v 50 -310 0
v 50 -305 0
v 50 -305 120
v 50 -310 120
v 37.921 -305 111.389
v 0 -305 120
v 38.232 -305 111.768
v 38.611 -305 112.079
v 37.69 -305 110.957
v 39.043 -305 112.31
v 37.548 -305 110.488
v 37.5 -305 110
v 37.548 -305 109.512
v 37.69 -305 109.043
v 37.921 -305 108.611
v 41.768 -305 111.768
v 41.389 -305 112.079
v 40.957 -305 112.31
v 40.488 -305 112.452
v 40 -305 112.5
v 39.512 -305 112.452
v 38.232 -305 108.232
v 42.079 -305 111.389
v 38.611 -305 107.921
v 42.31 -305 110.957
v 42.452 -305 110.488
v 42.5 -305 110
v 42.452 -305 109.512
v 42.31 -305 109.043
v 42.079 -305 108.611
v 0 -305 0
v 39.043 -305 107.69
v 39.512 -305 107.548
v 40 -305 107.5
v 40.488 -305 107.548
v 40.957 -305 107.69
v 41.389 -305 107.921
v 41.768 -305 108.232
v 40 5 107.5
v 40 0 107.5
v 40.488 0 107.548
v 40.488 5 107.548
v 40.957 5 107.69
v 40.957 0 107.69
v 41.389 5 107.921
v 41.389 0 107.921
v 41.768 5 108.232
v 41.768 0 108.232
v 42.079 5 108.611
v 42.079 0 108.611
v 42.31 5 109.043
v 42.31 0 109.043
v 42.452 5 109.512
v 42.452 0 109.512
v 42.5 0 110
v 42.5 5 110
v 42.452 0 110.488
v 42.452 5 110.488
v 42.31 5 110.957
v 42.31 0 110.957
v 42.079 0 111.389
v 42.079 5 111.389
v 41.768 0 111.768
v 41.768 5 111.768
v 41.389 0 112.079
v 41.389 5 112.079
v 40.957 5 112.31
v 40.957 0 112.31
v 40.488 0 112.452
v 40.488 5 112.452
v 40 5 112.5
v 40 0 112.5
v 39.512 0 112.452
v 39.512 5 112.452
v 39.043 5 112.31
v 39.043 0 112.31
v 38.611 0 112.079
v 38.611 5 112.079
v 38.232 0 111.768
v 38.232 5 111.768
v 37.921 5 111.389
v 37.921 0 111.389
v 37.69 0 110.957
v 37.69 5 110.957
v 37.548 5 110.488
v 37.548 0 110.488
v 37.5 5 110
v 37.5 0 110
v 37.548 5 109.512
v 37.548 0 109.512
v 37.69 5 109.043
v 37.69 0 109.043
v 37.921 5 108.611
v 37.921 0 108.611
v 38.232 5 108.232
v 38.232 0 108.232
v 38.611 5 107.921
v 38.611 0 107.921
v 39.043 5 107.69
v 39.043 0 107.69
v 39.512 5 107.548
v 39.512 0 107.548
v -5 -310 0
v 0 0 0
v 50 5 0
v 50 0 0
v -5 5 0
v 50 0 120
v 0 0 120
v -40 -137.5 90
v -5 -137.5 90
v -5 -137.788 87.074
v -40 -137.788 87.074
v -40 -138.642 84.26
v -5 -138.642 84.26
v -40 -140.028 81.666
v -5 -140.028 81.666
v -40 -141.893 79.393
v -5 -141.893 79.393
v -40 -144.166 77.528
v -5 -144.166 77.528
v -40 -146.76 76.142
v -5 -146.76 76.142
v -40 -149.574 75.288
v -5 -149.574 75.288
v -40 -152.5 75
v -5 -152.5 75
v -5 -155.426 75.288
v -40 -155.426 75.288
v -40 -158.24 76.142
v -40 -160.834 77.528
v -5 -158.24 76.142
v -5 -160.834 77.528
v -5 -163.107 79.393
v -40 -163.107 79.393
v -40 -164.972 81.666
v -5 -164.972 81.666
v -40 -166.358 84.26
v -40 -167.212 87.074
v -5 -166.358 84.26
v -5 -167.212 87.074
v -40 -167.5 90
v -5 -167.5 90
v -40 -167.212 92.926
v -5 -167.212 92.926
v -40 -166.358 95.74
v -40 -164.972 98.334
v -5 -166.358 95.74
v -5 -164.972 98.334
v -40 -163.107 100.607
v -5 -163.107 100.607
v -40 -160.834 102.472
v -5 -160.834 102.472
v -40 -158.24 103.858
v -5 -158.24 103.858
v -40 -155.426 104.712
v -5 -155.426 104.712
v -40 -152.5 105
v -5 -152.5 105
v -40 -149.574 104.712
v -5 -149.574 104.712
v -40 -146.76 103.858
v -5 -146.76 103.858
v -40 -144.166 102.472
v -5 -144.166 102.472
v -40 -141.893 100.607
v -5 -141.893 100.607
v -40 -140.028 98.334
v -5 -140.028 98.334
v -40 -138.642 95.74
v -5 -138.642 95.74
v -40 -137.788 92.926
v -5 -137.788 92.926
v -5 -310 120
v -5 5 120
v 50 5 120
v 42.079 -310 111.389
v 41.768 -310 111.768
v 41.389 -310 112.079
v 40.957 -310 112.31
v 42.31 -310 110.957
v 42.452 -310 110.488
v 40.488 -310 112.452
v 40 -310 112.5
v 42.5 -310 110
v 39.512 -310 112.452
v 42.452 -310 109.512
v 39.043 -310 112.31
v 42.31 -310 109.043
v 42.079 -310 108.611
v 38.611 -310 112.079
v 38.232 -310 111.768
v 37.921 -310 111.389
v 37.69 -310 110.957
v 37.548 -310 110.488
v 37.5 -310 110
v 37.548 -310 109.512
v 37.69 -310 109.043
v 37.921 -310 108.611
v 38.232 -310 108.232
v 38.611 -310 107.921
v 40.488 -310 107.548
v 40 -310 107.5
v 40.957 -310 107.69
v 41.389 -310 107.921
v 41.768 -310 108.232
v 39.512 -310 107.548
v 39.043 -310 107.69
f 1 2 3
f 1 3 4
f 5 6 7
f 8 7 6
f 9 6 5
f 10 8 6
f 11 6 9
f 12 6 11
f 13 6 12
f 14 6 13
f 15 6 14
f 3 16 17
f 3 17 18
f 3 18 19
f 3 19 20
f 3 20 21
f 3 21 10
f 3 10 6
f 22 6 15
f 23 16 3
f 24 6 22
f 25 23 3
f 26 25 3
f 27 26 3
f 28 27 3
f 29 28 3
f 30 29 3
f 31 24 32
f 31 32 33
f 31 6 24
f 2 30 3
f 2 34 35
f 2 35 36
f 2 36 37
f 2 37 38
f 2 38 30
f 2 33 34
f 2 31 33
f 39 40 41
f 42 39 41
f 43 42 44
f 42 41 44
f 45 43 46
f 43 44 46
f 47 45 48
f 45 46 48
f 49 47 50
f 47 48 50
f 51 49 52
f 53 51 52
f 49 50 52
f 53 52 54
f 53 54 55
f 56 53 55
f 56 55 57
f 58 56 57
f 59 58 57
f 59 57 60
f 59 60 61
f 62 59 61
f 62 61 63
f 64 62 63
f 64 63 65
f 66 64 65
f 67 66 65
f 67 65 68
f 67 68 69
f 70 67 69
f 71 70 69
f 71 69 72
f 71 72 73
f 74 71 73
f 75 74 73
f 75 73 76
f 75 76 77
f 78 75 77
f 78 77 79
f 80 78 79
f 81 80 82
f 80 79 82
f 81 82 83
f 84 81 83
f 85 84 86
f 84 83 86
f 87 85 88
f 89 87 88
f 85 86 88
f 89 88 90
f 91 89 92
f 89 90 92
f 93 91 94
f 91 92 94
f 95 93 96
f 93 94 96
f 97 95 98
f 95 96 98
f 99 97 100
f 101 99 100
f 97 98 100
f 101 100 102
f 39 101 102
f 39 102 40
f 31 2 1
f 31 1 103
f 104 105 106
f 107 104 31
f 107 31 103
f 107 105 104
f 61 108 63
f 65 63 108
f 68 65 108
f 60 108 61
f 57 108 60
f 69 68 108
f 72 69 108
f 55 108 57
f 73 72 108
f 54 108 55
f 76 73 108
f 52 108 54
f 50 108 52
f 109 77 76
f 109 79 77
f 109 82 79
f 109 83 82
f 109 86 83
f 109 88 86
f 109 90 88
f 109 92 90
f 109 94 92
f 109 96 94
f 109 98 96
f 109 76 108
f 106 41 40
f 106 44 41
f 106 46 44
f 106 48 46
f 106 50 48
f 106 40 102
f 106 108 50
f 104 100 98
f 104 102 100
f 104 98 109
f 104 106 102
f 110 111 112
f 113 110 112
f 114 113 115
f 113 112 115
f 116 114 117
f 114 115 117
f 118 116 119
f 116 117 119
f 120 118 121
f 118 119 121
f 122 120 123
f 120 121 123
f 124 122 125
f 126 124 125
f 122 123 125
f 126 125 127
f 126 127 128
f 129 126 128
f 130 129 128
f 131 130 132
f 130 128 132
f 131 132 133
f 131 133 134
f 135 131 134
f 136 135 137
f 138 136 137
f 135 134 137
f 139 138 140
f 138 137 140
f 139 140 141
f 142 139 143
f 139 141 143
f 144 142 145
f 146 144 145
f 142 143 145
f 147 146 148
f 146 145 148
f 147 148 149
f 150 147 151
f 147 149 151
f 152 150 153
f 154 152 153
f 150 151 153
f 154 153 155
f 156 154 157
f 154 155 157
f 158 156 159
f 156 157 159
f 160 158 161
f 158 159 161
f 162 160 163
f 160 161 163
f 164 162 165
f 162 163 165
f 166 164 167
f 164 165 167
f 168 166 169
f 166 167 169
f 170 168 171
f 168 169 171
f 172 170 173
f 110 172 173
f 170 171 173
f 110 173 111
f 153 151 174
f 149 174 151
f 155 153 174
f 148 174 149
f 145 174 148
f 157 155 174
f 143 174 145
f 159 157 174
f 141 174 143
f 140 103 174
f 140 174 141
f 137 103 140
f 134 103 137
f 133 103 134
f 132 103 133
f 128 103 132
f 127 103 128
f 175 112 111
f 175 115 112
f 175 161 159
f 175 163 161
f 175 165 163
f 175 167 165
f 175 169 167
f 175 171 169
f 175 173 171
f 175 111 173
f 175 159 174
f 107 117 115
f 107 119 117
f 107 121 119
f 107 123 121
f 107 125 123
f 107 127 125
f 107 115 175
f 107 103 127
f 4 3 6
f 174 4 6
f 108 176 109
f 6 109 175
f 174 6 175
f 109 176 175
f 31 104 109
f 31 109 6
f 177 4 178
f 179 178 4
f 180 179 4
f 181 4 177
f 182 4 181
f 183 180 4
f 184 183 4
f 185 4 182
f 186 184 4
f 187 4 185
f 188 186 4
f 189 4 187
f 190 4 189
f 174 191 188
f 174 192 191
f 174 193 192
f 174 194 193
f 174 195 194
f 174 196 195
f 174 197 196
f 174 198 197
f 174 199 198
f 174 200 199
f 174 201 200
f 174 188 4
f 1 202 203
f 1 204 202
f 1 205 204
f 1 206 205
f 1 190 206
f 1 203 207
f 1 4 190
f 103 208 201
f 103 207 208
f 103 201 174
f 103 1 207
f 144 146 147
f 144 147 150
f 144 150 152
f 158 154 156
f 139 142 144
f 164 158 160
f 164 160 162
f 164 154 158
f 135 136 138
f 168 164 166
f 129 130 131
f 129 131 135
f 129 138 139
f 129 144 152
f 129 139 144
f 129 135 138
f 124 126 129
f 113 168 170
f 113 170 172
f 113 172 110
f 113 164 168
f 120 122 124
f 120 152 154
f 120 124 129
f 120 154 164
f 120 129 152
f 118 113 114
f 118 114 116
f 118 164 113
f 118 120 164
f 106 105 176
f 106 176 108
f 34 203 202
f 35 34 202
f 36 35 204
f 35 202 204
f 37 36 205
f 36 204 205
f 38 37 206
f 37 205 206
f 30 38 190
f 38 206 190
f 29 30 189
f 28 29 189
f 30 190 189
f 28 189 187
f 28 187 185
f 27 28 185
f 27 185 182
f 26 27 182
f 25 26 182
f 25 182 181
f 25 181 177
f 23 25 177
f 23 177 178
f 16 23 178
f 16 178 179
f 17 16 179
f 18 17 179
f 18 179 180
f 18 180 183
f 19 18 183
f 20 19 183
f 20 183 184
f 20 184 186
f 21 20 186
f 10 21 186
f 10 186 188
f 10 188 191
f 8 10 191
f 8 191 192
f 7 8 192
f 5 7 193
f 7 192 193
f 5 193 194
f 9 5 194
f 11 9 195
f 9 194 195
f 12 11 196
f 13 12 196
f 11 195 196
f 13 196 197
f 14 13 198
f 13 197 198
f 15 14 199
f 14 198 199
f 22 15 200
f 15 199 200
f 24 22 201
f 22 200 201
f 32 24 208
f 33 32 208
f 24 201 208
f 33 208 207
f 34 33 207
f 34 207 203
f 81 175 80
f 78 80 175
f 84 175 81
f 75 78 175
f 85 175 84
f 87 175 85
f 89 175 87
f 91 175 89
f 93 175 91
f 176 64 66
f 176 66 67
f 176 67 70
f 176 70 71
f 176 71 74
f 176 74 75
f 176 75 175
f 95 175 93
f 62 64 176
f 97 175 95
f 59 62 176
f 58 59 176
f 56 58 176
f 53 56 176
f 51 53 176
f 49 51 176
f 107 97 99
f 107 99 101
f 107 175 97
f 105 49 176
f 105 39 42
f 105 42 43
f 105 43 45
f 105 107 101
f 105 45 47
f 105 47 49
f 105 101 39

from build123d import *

# Parameters (mm, degrees)
BOSS_EXTRUDE1_DEPTH = 120
SKETCH2_R           = 15
BOSS_EXTRUDE2_DEPTH = 35
SKETCH3_R           = 2.5
CUT_EXTRUDE1_DEPTH  = 320


with BuildPart() as part:
    # Sketch1 → Boss-Extrude1 (new body)
    with BuildSketch(Plane.XY):
        Polygon((-5, 5), (50, 5), (50, 0), (0, 0), (0, -305), (50, -305), (50, -310), (-5, -310), align=None)
    extrude(amount=BOSS_EXTRUDE1_DEPTH)

    # Sketch2 → Boss-Extrude2 (add)
    with BuildSketch(Plane.ZY.offset(5)):
        with Locations(Location((90, -152.5, 0), (0, 0, 90))):
            Circle(SKETCH2_R)
    extrude(amount=BOSS_EXTRUDE2_DEPTH)

    # Sketch3 → Cut-Extrude1 (cut)
    with BuildSketch(Plane.XZ.offset(310)):
        with Locations(Location((40, 110, 0), (0, 0, 270))):
            Circle(SKETCH3_R)
    extrude(amount=-CUT_EXTRUDE1_DEPTH, mode=Mode.SUBTRACT)


solid = part.part
